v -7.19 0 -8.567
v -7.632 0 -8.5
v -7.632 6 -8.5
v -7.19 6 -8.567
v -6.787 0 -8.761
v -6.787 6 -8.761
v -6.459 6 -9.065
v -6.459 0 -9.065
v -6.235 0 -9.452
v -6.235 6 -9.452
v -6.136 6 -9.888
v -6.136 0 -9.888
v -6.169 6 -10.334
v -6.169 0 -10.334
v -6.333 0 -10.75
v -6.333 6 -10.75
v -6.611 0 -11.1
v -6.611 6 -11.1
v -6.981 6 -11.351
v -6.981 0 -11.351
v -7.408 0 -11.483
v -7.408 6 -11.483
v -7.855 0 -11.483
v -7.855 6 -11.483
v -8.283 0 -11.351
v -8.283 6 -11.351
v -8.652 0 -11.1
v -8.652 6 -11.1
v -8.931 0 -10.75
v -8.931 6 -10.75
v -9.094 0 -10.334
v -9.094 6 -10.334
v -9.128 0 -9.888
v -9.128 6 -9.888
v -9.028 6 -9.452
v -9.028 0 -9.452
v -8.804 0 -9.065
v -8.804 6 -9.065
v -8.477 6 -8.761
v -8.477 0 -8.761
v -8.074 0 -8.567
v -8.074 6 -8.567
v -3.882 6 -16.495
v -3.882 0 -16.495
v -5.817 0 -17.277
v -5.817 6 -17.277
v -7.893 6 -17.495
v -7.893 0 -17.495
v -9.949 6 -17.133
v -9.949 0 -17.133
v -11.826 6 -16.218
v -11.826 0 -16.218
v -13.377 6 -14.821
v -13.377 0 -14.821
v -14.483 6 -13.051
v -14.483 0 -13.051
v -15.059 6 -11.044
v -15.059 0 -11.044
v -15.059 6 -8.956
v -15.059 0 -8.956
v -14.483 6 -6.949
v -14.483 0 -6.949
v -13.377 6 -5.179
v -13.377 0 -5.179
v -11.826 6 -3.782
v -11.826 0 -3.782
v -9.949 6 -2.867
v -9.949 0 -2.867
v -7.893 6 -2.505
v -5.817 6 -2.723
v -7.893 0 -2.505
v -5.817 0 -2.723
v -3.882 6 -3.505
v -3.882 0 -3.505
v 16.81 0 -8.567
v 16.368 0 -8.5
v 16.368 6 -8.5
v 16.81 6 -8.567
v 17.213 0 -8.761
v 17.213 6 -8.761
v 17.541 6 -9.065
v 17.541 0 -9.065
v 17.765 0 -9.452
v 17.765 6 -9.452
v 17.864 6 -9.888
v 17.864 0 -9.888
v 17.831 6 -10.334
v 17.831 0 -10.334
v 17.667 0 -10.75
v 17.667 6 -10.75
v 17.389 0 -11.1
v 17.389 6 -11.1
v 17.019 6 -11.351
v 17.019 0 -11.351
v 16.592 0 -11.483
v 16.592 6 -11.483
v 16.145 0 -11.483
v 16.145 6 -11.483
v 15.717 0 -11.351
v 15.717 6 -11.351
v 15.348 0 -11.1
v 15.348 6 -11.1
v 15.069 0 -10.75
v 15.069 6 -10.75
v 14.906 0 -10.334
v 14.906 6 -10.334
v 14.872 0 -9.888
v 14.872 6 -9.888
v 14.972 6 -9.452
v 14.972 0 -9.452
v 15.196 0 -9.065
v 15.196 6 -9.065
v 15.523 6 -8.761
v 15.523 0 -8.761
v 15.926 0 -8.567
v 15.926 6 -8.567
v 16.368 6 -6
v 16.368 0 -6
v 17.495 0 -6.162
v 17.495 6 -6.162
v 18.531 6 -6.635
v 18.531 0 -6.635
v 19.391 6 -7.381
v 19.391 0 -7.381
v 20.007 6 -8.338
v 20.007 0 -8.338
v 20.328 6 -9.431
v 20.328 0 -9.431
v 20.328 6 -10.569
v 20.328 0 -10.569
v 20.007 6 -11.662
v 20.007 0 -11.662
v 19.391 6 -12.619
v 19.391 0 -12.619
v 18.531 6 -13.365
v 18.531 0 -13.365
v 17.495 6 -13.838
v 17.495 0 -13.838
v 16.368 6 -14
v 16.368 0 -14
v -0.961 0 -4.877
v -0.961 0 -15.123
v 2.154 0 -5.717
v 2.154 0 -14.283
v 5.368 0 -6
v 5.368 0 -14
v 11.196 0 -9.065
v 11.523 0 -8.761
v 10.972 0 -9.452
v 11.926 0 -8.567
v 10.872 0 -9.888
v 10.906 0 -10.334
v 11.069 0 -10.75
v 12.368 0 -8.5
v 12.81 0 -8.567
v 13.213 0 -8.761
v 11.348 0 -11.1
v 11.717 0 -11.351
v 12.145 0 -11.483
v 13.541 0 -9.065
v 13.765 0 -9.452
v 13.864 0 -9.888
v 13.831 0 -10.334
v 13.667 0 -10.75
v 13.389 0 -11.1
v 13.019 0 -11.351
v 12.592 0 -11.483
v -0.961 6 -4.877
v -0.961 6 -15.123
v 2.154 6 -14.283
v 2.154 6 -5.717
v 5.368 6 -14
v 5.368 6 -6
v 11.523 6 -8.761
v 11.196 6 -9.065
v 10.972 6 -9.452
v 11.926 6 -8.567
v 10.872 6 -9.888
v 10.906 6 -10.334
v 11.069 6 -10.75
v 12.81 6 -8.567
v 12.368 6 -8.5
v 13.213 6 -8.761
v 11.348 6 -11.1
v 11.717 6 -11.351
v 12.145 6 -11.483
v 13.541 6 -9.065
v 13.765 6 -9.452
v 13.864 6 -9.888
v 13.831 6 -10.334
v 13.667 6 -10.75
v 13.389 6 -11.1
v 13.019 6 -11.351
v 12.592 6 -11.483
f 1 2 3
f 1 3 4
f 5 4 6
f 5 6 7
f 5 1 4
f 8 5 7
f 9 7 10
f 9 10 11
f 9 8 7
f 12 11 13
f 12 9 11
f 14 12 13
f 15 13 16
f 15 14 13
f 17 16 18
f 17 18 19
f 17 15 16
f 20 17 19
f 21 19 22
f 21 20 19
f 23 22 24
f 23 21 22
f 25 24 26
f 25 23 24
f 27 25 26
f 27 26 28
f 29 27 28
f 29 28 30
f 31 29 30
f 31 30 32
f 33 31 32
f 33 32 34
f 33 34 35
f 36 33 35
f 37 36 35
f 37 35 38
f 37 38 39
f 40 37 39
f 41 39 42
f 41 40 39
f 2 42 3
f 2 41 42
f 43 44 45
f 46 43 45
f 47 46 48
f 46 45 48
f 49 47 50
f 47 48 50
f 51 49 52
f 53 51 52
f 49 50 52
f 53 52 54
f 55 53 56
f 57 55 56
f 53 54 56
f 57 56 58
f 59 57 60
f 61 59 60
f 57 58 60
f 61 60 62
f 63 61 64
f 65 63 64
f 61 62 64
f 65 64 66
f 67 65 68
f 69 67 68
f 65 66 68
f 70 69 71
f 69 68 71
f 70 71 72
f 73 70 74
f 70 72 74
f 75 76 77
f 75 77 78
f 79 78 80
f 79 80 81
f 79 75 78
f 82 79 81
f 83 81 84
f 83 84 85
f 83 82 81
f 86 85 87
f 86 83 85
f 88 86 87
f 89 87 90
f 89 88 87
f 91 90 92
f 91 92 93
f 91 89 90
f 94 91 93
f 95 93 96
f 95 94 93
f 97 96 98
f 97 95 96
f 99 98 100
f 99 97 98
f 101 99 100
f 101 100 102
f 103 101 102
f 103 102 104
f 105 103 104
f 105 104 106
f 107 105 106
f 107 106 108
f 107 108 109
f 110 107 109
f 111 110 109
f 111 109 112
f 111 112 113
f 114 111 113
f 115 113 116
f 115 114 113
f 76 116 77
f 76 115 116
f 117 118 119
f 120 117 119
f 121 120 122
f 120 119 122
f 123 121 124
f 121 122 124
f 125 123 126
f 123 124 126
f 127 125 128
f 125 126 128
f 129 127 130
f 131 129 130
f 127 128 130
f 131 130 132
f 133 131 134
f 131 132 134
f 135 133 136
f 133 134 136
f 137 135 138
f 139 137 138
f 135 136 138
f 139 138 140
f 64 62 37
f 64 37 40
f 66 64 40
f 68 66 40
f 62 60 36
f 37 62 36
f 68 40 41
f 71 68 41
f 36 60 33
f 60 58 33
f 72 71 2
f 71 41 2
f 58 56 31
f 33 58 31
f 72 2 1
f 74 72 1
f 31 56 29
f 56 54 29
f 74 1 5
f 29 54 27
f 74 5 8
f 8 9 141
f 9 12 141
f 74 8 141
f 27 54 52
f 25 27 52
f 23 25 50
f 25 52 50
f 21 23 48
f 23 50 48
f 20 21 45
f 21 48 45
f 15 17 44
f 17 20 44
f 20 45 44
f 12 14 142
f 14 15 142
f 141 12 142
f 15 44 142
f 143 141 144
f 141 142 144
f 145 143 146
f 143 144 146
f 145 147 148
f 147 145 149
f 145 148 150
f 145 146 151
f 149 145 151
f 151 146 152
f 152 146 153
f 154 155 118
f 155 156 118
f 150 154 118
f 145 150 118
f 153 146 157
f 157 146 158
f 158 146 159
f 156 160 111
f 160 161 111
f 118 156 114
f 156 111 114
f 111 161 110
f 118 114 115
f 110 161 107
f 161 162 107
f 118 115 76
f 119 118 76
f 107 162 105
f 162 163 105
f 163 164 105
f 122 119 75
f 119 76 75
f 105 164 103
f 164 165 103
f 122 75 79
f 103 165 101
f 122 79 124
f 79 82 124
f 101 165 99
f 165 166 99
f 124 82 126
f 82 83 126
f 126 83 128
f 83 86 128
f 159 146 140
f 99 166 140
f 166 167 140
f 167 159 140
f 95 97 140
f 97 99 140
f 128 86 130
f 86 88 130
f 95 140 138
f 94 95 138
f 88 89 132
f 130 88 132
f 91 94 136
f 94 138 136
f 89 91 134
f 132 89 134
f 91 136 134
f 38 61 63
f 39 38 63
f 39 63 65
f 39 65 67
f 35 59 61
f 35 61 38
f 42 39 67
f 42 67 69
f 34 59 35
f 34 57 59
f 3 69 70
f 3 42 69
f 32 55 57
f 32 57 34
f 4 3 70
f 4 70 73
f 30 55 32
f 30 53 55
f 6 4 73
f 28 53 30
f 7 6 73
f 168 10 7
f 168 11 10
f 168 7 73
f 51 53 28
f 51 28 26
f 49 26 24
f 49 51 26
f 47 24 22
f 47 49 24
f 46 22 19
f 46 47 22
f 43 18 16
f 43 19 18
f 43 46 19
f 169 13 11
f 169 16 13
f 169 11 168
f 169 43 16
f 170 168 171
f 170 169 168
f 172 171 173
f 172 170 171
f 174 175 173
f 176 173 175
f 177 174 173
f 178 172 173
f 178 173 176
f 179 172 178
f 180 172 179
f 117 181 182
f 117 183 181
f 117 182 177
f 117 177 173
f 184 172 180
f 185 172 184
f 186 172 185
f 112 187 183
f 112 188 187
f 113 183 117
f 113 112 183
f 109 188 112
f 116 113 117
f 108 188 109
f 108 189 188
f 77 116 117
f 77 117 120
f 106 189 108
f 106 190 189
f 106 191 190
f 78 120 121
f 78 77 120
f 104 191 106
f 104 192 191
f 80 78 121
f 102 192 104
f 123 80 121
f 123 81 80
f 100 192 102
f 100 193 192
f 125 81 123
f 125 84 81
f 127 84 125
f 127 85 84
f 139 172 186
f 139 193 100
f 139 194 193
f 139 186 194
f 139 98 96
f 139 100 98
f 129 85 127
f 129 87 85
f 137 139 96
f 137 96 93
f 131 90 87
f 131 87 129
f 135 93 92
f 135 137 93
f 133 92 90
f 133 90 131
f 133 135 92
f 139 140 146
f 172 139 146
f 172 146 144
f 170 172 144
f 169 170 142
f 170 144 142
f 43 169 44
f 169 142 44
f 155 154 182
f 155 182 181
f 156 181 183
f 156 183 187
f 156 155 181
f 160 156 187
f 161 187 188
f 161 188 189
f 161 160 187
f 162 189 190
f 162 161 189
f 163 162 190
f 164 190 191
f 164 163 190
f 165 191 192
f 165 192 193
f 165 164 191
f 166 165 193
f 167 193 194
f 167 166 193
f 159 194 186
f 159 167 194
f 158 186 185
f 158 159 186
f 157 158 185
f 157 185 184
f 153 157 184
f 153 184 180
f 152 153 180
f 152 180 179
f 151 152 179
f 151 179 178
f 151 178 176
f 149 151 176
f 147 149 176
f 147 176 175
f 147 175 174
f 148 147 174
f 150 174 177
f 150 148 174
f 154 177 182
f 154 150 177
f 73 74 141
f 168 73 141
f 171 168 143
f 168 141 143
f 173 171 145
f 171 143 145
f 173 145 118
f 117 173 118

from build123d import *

# Parameters (mm, degrees)
SKETCH_3_R      = 1.5
EXTRUDE_1_DEPTH = 6


with BuildPart() as part:
    # 草图3 → 凸台-拉伸1 (new body)
    with BuildSketch(Plane(origin=(0, 0, 0), x_dir=(1, 0, 0), z_dir=(0, 1, 0))):
        with BuildLine():
            Line((16.368265324, 14), (5.368265324, 14))
            ThreePointArc((5.368265324, 14), (0.577950205, 14.634750338), (-3.881734676, 16.495190528))
            ThreePointArc((-3.881734676, 16.495190528), (-15.131734676, 10), (-3.881734676, 3.504809472))
            ThreePointArc((-3.881734676, 3.504809472), (0.577950205, 5.365249662), (5.368265324, 6))
            Line((5.368265324, 6), (16.368265324, 6))
            ThreePointArc((16.368265324, 6), (20.368265324, 10), (16.368265324, 14))
        make_face()
        with Locations(Location((-7.631734676, 10, 0), (0, 0, 270))):
            Circle(SKETCH_3_R, mode=Mode.SUBTRACT)
        with Locations(Location((12.368265324, 10, 0), (0, 0, 270))):
            Circle(SKETCH_3_R, mode=Mode.SUBTRACT)
        with Locations(Location((16.368265324, 10, 0), (0, 0, 270))):
            Circle(SKETCH_3_R, mode=Mode.SUBTRACT)
    extrude(amount=EXTRUDE_1_DEPTH)


solid = part.part
